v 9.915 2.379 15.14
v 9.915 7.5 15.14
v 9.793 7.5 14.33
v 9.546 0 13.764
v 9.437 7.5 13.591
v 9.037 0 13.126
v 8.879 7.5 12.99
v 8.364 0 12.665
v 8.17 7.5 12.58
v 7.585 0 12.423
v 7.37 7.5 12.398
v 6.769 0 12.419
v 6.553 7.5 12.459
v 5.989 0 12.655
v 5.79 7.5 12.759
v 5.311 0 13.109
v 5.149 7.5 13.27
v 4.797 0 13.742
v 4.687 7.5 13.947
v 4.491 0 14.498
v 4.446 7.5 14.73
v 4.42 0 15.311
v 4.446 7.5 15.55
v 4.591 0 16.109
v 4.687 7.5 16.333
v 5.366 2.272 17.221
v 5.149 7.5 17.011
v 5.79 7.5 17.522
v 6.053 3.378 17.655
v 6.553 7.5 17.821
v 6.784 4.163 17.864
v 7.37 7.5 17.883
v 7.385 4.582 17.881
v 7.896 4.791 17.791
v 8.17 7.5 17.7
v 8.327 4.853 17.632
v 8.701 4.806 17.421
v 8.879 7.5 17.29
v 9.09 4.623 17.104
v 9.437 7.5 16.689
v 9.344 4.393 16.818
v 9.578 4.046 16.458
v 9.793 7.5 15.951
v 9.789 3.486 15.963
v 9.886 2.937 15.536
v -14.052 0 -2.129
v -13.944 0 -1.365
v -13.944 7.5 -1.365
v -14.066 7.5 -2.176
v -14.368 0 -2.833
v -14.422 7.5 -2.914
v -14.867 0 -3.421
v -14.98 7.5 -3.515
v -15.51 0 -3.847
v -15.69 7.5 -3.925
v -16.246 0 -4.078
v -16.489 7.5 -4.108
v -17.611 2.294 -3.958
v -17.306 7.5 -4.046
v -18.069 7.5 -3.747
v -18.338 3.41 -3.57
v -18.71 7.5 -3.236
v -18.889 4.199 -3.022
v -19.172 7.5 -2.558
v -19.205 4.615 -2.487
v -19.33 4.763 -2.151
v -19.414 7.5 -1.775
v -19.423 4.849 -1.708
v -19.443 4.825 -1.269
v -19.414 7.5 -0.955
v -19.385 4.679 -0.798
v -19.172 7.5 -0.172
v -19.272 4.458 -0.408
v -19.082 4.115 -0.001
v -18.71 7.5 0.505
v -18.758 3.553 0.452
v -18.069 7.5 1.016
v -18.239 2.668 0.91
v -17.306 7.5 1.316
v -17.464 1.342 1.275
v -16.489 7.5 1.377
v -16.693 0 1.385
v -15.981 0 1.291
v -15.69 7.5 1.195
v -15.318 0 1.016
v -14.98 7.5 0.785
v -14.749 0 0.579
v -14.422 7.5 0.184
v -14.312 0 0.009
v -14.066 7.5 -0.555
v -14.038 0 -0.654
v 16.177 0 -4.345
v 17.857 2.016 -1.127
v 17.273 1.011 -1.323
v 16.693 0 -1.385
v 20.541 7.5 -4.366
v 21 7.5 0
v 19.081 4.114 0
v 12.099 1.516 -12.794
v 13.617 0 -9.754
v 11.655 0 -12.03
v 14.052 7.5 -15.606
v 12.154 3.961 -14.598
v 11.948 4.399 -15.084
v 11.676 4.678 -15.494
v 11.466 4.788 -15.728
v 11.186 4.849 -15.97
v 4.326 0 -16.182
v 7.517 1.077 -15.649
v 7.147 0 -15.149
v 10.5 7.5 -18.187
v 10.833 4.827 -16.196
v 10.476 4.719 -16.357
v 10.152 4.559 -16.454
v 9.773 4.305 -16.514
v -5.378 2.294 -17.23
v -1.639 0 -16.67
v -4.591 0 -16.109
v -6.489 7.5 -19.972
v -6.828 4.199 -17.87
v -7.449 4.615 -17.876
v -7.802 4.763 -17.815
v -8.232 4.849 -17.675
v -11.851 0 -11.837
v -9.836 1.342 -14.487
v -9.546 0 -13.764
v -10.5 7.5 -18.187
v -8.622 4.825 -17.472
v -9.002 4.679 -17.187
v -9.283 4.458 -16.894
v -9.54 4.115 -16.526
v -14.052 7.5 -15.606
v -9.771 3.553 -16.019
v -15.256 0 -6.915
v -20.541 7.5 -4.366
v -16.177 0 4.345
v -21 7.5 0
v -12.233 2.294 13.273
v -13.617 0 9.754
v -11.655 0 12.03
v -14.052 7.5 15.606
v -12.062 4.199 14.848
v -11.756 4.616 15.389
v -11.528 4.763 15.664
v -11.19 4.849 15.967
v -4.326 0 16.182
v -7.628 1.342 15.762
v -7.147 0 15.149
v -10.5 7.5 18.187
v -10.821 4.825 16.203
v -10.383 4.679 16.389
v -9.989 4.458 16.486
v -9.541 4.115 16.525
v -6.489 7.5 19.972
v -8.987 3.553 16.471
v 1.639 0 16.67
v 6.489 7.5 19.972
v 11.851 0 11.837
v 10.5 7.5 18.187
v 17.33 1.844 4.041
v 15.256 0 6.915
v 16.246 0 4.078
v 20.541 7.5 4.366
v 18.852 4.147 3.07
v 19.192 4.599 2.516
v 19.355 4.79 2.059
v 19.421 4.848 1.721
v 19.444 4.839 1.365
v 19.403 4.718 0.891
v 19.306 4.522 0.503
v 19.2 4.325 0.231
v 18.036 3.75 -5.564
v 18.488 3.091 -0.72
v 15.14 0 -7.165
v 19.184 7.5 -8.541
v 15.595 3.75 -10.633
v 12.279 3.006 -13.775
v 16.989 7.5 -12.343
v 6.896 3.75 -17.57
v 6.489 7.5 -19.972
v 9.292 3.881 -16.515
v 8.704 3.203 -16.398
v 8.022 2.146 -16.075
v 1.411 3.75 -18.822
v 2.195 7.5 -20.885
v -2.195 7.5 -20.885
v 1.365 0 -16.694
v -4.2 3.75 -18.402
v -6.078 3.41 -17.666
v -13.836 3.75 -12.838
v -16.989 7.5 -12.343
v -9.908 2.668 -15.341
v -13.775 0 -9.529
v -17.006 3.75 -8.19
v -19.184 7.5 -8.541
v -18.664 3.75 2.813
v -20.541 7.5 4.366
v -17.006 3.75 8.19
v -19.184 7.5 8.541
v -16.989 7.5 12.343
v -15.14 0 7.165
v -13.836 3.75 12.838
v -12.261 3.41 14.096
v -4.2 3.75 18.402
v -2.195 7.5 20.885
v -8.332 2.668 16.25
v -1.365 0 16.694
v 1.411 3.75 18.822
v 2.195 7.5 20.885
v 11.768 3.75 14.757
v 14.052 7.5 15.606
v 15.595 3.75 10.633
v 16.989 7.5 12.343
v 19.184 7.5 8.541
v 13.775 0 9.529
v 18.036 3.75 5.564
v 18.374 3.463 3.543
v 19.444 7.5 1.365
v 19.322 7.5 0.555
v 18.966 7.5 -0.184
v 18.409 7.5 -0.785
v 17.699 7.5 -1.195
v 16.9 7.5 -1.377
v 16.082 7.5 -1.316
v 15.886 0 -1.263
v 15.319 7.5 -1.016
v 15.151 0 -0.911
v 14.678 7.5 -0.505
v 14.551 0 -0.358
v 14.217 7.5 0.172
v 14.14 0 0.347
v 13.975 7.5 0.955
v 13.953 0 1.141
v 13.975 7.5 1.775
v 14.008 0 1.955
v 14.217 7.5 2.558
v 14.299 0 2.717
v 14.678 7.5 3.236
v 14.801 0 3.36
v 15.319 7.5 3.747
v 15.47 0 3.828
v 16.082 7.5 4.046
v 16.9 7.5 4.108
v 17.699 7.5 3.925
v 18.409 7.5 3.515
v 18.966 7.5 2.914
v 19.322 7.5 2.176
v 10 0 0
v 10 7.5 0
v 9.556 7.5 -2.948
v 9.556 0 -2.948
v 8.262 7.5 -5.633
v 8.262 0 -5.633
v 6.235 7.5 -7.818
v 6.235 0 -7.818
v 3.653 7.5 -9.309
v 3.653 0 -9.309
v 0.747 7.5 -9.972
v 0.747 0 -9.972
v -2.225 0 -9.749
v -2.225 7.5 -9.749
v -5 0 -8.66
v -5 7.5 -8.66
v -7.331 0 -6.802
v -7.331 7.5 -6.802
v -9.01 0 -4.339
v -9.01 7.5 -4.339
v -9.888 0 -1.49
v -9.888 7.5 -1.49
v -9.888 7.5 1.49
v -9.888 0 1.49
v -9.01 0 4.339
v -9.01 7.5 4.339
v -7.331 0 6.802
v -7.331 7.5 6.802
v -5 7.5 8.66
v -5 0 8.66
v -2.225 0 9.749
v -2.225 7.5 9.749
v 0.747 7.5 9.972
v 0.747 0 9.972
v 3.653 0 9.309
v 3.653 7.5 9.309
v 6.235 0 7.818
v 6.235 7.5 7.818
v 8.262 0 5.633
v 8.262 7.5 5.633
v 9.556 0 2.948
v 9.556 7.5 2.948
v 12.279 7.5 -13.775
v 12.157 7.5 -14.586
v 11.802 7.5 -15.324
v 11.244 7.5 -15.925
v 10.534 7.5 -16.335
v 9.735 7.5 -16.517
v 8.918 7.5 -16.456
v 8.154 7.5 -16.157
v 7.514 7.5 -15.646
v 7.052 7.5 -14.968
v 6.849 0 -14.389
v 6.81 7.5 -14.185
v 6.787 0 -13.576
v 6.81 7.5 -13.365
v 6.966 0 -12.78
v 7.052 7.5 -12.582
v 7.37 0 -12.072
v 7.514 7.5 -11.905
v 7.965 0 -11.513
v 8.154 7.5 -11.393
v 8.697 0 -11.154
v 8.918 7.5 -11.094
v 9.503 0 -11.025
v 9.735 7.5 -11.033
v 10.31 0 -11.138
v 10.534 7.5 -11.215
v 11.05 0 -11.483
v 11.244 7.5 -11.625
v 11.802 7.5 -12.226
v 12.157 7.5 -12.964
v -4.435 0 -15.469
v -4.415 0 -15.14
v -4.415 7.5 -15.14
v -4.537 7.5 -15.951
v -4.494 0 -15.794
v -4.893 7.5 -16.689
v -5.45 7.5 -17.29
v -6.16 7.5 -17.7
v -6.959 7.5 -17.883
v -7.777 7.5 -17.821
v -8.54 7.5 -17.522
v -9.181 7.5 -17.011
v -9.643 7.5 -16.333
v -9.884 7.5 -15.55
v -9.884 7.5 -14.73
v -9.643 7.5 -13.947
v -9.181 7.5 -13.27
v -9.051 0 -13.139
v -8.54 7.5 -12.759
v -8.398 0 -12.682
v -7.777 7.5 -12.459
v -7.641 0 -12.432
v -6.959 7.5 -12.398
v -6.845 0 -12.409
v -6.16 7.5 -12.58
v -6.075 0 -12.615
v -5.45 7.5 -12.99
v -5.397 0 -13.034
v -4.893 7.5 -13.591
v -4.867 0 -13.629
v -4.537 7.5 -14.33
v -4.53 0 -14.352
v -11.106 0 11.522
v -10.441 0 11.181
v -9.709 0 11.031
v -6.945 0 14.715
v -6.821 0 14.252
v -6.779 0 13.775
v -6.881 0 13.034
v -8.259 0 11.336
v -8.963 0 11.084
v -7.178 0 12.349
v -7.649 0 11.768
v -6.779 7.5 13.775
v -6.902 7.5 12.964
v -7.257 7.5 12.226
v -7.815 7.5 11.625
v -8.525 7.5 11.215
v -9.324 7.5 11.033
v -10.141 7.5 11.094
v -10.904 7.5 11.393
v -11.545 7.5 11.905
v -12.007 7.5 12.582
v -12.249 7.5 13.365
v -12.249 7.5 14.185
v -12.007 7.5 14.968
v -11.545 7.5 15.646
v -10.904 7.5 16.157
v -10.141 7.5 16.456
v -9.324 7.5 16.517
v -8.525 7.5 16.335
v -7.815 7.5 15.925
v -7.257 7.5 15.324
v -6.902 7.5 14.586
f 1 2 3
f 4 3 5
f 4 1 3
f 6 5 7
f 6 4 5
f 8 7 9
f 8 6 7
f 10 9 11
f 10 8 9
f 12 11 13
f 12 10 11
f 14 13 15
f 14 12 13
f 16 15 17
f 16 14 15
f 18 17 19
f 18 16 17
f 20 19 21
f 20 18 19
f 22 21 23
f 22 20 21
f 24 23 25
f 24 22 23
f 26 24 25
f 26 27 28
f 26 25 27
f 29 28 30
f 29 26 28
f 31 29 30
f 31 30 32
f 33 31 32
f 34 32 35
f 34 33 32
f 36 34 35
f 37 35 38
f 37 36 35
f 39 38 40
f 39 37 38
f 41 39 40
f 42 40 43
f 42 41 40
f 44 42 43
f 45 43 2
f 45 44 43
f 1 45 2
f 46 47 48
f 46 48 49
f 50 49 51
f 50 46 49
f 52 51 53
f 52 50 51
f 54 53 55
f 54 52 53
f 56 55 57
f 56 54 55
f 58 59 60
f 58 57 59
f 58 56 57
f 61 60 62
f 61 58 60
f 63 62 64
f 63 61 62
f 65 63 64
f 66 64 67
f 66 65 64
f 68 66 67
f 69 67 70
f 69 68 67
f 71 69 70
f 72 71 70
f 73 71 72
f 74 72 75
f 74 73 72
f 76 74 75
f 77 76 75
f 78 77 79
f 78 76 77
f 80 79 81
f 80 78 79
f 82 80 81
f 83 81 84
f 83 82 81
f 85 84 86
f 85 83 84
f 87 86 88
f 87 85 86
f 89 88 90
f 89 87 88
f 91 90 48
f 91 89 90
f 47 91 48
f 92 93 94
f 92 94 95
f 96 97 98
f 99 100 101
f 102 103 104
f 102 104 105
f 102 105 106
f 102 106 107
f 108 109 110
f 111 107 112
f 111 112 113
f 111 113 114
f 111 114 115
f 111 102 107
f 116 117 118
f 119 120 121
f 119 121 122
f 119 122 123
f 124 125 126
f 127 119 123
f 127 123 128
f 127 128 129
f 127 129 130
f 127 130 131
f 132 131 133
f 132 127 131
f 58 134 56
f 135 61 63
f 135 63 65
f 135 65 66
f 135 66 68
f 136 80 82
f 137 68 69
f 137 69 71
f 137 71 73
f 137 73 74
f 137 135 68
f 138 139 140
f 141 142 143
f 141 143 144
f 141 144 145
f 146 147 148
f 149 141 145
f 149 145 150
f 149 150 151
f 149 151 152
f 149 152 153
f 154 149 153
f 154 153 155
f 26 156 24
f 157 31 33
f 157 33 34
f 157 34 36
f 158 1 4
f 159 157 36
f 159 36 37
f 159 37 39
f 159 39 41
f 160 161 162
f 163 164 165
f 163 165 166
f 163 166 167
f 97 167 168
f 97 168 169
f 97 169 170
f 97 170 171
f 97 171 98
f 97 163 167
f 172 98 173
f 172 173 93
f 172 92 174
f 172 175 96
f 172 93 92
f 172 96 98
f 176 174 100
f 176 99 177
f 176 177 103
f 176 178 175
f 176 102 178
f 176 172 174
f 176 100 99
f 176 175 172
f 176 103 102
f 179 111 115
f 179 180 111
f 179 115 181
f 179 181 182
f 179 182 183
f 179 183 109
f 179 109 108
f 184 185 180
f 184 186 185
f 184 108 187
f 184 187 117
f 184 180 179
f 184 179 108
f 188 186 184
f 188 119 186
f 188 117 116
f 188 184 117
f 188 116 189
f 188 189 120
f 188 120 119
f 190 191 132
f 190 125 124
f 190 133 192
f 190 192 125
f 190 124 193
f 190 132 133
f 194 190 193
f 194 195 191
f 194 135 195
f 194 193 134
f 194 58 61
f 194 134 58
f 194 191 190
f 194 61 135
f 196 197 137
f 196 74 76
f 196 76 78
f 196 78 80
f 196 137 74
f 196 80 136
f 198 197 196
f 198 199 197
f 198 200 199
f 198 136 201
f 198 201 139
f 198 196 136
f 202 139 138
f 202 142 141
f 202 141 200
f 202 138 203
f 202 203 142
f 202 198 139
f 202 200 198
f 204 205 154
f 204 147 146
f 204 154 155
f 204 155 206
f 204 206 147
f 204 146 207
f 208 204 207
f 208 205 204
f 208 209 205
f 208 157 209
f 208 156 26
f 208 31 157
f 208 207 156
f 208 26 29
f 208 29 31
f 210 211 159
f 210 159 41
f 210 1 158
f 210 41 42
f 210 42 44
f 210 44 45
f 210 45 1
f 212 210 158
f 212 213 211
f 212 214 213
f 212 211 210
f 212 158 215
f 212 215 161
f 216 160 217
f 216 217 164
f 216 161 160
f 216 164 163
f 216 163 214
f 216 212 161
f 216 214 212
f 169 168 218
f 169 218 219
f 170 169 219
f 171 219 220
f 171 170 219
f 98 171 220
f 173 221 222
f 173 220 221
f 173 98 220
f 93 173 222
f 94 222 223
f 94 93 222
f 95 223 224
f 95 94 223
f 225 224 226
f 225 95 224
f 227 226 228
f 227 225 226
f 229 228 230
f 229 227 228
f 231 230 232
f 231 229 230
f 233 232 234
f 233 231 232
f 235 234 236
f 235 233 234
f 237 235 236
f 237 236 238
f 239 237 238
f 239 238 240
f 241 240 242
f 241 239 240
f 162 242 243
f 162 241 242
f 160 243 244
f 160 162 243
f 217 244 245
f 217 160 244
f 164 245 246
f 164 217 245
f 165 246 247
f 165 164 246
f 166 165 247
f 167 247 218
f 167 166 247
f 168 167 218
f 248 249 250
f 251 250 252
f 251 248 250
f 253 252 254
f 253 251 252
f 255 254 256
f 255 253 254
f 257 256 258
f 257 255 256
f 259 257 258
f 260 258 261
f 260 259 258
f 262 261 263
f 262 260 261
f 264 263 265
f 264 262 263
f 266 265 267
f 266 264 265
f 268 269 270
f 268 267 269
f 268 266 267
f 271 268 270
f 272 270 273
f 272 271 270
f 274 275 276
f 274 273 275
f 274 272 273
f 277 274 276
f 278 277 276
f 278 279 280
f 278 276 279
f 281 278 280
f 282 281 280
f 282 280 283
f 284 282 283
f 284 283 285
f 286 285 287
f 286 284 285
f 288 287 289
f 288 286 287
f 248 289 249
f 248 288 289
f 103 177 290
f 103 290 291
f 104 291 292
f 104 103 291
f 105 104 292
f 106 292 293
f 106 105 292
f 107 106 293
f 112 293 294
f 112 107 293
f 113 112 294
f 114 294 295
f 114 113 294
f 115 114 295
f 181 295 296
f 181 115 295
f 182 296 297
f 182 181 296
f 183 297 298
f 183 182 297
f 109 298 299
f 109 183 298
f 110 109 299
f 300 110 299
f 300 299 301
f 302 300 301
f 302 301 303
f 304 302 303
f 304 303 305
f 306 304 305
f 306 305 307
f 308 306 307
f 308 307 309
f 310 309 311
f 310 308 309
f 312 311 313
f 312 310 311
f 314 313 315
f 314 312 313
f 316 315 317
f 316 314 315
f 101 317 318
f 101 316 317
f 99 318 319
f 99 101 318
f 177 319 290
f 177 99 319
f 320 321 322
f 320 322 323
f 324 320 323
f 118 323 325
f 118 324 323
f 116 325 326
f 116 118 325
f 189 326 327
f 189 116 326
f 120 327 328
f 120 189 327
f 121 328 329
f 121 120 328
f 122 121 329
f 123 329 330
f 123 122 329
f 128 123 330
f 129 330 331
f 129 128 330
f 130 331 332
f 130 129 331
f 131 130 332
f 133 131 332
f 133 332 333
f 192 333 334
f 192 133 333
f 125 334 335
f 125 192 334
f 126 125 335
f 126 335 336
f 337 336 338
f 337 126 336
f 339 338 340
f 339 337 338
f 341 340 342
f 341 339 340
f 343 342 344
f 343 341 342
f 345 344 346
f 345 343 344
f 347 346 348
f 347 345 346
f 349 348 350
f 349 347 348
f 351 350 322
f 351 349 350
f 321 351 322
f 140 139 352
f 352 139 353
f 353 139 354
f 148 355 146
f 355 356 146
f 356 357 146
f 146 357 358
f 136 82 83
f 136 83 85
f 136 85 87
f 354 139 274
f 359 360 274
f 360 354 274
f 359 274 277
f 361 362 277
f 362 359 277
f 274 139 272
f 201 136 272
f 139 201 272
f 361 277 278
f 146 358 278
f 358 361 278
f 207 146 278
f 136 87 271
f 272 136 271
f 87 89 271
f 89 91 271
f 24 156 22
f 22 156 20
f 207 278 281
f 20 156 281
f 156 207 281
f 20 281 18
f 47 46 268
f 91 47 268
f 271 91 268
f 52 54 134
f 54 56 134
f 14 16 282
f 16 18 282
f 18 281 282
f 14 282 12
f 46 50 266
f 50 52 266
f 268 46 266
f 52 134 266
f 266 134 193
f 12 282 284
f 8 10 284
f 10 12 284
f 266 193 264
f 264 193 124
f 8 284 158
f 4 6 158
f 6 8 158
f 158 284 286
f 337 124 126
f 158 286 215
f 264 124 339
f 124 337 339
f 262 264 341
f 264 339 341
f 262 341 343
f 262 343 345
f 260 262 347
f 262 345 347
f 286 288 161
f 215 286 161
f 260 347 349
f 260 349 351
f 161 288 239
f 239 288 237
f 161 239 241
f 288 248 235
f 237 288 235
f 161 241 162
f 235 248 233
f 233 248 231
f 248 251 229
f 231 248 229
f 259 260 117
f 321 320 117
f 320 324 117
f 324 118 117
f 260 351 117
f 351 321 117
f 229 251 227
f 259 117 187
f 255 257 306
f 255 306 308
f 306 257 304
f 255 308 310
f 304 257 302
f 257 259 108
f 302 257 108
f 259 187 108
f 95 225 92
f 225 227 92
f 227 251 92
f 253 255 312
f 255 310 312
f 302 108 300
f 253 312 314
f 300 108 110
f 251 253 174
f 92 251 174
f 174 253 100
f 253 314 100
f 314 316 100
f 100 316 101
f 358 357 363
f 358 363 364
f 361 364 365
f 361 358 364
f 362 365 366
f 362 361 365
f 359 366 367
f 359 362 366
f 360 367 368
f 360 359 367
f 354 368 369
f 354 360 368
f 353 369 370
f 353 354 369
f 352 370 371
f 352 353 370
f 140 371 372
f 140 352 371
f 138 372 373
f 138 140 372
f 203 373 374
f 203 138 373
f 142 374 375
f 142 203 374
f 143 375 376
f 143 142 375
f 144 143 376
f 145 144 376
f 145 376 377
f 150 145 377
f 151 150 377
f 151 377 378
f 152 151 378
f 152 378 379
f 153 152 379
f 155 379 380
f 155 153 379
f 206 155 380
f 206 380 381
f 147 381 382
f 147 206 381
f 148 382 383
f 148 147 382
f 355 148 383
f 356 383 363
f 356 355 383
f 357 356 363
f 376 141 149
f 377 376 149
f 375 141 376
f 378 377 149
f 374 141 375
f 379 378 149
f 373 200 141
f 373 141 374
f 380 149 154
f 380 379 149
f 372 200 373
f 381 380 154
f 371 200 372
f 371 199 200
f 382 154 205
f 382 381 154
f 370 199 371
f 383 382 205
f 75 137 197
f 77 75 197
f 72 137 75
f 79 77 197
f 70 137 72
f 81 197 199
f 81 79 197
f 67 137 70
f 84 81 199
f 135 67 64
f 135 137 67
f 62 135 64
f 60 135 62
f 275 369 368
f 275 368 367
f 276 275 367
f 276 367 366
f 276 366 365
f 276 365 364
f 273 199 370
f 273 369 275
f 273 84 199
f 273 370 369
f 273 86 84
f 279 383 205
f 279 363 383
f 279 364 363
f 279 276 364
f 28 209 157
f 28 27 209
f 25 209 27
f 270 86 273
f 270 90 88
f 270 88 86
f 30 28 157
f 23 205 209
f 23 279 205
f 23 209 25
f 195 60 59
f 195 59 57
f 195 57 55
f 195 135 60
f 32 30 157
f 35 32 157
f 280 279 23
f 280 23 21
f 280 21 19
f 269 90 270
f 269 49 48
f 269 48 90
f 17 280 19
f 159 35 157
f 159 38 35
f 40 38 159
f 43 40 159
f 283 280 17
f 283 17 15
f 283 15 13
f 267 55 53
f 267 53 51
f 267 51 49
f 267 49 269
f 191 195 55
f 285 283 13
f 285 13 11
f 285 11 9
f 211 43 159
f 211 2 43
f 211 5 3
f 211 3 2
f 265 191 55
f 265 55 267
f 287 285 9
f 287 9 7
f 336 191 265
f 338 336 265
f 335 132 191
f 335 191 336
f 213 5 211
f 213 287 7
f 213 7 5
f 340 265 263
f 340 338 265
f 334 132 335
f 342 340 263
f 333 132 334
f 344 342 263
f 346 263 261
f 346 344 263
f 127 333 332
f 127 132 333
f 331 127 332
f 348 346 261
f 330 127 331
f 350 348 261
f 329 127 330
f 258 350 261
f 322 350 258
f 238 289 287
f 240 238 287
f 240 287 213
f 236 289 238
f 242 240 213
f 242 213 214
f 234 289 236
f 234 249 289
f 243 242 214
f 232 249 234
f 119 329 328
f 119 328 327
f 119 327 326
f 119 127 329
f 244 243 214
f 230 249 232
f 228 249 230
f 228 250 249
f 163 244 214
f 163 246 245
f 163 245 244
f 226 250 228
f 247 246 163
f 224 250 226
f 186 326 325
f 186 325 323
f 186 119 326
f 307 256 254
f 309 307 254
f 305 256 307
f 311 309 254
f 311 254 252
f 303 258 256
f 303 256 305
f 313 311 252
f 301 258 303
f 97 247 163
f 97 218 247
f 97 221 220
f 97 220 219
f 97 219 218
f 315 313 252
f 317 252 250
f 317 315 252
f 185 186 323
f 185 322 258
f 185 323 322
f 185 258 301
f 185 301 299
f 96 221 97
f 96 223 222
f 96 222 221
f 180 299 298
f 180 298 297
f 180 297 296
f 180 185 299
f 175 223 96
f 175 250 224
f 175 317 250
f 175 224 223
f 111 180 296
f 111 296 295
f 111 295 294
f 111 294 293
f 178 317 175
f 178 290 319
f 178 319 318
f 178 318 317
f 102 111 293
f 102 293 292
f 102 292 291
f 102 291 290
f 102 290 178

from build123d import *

# Parameters (mm, degrees)
SKETCH1_R          = 16.75
SKETCH2_R          = 21
SKETCH1_4_R        = 2.75
SKETCH1_4_R_2      = 10
CUT_EXTRUDE1_DEPTH = 8.5000001


with BuildPart() as part:
    # Sketch1 → Loft1 section 0
    with BuildSketch(Plane(origin=(0, 0, 0), x_dir=(1, 0, 0), z_dir=(0, 1, 0))):
        Circle(SKETCH1_R)
    # Sketch2 → Loft1 section 1
    with BuildSketch(Plane(origin=(0, 7.5, 0), x_dir=(1, 0, 0), z_dir=(0, 1, 0))):
        Circle(SKETCH2_R)
    loft()

    # Sketch1<4> → Cut-Extrude1 (cut, through all)
    with BuildSketch(Plane(origin=(0, 0, 0), x_dir=(1, 0, 0), z_dir=(0, 1, 0))):
        with Locations((-16.694272111, 1.365202803)):
            Circle(SKETCH1_4_R)
        with Locations((-9.529436364, -13.775062344)):
            Circle(SKETCH1_4_R)
        with Locations((9.529436364, 13.775062344)):
            Circle(SKETCH1_4_R)
        with Locations((-7.164835747, 15.140265147)):
            Circle(SKETCH1_4_R)
        Circle(SKETCH1_4_R_2)
        with Locations((7.164835747, -15.140265147)):
            Circle(SKETCH1_4_R)
        with Locations((16.694272111, -1.365202803)):
            Circle(SKETCH1_4_R)
    extrude(amount=CUT_EXTRUDE1_DEPTH, mode=Mode.SUBTRACT)


solid = part.part
